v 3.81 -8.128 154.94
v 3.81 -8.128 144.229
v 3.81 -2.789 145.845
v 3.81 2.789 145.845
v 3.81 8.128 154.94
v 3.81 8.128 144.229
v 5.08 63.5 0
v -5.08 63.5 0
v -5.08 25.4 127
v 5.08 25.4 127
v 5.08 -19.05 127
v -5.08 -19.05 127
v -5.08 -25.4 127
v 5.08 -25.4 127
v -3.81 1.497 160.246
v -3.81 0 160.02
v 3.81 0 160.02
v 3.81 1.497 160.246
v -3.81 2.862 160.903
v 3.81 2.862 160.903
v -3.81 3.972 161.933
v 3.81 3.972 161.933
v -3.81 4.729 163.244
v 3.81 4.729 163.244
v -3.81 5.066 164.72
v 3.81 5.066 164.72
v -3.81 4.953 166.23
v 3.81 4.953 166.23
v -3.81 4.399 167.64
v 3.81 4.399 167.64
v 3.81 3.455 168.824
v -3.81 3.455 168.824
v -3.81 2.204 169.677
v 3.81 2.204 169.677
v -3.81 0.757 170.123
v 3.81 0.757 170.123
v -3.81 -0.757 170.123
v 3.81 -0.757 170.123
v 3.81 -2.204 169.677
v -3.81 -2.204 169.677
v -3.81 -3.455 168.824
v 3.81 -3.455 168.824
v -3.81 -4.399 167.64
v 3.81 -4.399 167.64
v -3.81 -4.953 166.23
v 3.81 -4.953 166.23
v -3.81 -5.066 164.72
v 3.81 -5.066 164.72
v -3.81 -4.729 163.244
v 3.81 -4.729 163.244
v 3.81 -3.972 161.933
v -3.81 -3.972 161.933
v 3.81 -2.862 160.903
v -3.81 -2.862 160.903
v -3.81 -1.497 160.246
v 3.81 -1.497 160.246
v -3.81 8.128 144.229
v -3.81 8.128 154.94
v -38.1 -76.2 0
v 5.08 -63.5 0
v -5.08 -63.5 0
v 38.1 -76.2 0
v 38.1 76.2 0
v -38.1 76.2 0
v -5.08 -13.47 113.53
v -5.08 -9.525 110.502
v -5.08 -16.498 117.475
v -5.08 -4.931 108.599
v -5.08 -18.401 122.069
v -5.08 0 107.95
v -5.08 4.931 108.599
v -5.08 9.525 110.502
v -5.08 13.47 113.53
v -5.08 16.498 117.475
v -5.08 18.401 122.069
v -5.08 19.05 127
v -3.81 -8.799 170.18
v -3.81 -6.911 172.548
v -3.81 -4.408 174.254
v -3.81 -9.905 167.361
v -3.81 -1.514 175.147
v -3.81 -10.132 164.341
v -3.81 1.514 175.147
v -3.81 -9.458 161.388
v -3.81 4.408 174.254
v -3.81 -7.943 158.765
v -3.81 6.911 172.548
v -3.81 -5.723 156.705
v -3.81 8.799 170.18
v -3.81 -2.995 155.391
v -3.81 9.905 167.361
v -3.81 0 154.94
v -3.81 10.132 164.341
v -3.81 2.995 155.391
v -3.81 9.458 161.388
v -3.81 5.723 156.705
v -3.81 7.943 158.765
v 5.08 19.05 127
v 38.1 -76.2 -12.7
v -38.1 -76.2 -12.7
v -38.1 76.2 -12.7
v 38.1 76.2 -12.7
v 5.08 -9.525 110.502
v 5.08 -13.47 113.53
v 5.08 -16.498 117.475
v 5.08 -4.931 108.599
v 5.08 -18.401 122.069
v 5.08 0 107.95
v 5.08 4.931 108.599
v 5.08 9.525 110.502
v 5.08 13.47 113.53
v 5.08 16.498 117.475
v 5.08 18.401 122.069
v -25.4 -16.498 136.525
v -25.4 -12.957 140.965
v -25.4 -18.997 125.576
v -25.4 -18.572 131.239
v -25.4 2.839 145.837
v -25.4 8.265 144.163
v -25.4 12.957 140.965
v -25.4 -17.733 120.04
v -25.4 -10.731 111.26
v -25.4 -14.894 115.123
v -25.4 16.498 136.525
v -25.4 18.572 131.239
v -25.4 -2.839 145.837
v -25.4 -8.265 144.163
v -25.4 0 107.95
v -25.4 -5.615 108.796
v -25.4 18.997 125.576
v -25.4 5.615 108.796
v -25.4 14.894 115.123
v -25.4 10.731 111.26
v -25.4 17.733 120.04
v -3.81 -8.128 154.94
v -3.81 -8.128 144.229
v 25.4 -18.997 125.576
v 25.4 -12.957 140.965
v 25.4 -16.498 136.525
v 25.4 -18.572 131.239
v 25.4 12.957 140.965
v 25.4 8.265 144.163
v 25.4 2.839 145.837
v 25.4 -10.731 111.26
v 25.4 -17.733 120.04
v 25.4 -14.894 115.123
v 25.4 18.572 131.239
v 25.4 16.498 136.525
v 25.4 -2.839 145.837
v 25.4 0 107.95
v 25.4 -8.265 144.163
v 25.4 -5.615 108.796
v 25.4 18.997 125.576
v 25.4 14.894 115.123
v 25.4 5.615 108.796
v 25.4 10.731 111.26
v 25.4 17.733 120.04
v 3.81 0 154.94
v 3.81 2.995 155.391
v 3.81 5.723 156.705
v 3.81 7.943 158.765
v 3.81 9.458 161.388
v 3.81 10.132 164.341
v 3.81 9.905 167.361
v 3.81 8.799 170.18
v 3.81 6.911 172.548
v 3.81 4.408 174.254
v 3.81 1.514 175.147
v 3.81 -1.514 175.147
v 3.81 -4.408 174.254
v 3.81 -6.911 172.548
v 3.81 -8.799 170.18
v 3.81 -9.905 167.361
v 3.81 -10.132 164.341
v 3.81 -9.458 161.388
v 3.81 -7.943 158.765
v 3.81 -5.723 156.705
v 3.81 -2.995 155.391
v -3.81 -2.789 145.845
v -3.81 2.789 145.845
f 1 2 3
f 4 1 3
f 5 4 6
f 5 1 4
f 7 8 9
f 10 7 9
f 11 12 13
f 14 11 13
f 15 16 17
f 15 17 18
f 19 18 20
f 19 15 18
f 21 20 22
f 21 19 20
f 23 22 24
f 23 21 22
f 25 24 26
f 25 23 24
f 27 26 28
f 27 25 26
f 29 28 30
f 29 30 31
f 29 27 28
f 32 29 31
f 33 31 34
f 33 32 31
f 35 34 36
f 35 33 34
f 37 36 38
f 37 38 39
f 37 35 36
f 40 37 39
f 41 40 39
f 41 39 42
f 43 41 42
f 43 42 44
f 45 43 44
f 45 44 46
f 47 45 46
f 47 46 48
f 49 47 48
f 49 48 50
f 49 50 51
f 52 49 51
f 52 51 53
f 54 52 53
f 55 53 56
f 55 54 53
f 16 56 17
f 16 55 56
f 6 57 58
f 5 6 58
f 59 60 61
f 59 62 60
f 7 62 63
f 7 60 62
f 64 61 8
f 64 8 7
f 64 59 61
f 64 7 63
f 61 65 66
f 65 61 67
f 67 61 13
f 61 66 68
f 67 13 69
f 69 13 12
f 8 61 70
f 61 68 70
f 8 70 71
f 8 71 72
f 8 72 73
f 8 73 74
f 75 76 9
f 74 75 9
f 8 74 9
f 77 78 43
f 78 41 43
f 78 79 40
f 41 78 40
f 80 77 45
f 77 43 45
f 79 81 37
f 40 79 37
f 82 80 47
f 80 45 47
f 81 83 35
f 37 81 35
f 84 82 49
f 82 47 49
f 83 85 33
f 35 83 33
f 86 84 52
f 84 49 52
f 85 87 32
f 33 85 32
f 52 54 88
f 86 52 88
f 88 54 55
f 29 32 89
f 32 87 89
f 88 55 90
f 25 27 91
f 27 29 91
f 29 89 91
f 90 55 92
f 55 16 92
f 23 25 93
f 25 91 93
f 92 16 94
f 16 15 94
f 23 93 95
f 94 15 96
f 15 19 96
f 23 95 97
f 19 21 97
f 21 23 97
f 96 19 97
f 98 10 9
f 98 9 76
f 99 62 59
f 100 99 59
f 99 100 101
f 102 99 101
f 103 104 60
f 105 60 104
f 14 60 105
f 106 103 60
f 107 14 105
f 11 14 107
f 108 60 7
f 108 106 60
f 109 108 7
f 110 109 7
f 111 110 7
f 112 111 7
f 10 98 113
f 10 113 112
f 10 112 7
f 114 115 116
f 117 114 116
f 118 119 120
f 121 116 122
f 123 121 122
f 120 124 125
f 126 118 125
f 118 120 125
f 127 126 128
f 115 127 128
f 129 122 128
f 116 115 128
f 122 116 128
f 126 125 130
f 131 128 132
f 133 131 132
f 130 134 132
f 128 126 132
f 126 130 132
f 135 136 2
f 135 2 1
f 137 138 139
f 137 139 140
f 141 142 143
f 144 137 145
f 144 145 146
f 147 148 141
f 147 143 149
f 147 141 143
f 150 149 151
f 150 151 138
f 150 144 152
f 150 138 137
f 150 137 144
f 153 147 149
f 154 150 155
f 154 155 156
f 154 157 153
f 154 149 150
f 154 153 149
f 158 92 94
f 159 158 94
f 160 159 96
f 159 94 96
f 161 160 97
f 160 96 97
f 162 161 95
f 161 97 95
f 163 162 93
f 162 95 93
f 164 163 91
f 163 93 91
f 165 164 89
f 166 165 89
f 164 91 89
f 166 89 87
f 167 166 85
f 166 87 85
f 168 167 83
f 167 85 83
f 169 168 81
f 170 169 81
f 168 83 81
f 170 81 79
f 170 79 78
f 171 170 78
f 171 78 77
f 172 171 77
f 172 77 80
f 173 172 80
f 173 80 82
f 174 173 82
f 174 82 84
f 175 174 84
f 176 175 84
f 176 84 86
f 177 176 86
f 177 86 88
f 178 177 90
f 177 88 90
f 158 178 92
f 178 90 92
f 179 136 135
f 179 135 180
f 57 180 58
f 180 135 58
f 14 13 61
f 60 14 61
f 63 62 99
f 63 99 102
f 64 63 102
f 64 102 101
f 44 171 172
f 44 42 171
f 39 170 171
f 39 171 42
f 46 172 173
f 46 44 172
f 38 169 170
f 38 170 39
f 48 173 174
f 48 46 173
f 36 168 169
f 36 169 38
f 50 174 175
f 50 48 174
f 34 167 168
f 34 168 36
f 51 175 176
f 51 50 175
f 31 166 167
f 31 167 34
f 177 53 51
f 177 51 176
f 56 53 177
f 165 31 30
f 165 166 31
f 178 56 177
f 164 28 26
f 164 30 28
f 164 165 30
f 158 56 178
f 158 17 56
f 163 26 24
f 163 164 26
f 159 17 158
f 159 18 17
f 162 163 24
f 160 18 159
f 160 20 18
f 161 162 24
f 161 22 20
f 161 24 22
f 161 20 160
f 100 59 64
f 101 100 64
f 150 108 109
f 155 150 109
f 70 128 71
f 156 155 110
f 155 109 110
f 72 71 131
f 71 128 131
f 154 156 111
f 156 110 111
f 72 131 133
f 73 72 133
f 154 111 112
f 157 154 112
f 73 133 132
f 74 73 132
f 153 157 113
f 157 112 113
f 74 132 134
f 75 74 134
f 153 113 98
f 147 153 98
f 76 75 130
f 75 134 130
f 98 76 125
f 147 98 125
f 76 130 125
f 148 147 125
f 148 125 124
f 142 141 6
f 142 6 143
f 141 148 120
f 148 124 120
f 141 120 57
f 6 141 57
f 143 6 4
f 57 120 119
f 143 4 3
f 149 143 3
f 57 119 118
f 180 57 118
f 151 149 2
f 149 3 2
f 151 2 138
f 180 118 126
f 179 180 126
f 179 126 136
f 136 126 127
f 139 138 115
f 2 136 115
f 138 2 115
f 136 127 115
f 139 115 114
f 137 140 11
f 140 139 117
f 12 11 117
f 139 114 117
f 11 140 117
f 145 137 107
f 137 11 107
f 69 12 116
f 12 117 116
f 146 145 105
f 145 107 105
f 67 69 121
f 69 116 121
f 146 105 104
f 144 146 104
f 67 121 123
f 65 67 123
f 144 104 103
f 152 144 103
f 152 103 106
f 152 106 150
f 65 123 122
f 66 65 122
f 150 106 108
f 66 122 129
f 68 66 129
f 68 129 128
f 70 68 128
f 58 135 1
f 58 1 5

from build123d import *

# Parameters (mm, degrees)
BASE_PLATE_SKETCH_W         = 152.4
BASE_PLATE_SKETCH_H         = 76.2
BASE_PLATE_DEPTH            = 12.7
A_FRAME_BODY_DEPTH          = 5.08
A_FRAME_BODY_DEPTH_BACK     = 5.08
BEARING_HOUSING_DEPTH       = 25.4
BEARING_HOUSING_DEPTH_BACK  = 25.4
BEARING_HOUSING_SKETCH_R    = 19.05
LIFTING_EYELET_DEPTH        = 3.81
LIFTING_EYELET_DEPTH_BACK   = 3.81
LIFTING_EYELET_SKETCH_R     = 10.16
LIFTING_EYELET_SKETCH_R_2   = 5.08
EYELET_CONNECTOR_DEPTH      = 3.81
EYELET_CONNECTOR_DEPTH_BACK = 3.81
EYELET_CONNECTOR_SKETCH_W   = 16.256
EYELET_CONNECTOR_SKETCH_H   = 17.78


with BuildPart() as part:
    # Base Plate Sketch → Base Plate (new body)
    with BuildSketch(Plane(origin=(0, 0, 0), x_dir=(0, 1, 0), z_dir=(0, 0, 1))):
        Rectangle(BASE_PLATE_SKETCH_W, BASE_PLATE_SKETCH_H)
    extrude(amount=-BASE_PLATE_DEPTH)

    # A-Frame Sketch → A-Frame Body (add, two sides: drawn at the far end of the back side and taken through both)
    with BuildSketch(Plane.YZ.offset(-A_FRAME_BODY_DEPTH_BACK)):
        Polygon((-63.5, 0), (63.5, 0), (25.4, 127), (-25.4, 127), align=None)
    extrude(amount=A_FRAME_BODY_DEPTH + A_FRAME_BODY_DEPTH_BACK)

    # Bearing Housing Sketch → Bearing Housing (add, two sides: drawn at the far end of the back side and taken through both)
    with BuildSketch(Plane.YZ.offset(-BEARING_HOUSING_DEPTH_BACK)):
        with Locations(Location((0, 127, 0), (0, 0, 270))):
            Circle(BEARING_HOUSING_SKETCH_R)
    extrude(amount=BEARING_HOUSING_DEPTH + BEARING_HOUSING_DEPTH_BACK)

    # Eyelet Connector Sketch → Eyelet Connector (add, two sides: drawn at the far end of the back side and taken through both)
    with BuildSketch(Plane.YZ.offset(-EYELET_CONNECTOR_DEPTH_BACK)):
        with Locations((0, 146.05)):
            Rectangle(EYELET_CONNECTOR_SKETCH_W, EYELET_CONNECTOR_SKETCH_H)
    extrude(amount=EYELET_CONNECTOR_DEPTH + EYELET_CONNECTOR_DEPTH_BACK)


with BuildPart() as body_2:
    # Lifting Eyelet Sketch → Lifting Eyelet (new, two sides: drawn at the far end of the back side and taken through both)
    with BuildSketch(Plane.YZ.offset(-LIFTING_EYELET_DEPTH_BACK)):
        with Locations(Location((0, 165.1, 0), (0, 0, 270))):
            Circle(LIFTING_EYELET_SKETCH_R)
        with Locations(Location((0, 165.1, 0), (0, 0, 270))):
            Circle(LIFTING_EYELET_SKETCH_R_2, mode=Mode.SUBTRACT)
    extrude(amount=LIFTING_EYELET_DEPTH + LIFTING_EYELET_DEPTH_BACK)


solid = Compound([part.part, body_2.part])
